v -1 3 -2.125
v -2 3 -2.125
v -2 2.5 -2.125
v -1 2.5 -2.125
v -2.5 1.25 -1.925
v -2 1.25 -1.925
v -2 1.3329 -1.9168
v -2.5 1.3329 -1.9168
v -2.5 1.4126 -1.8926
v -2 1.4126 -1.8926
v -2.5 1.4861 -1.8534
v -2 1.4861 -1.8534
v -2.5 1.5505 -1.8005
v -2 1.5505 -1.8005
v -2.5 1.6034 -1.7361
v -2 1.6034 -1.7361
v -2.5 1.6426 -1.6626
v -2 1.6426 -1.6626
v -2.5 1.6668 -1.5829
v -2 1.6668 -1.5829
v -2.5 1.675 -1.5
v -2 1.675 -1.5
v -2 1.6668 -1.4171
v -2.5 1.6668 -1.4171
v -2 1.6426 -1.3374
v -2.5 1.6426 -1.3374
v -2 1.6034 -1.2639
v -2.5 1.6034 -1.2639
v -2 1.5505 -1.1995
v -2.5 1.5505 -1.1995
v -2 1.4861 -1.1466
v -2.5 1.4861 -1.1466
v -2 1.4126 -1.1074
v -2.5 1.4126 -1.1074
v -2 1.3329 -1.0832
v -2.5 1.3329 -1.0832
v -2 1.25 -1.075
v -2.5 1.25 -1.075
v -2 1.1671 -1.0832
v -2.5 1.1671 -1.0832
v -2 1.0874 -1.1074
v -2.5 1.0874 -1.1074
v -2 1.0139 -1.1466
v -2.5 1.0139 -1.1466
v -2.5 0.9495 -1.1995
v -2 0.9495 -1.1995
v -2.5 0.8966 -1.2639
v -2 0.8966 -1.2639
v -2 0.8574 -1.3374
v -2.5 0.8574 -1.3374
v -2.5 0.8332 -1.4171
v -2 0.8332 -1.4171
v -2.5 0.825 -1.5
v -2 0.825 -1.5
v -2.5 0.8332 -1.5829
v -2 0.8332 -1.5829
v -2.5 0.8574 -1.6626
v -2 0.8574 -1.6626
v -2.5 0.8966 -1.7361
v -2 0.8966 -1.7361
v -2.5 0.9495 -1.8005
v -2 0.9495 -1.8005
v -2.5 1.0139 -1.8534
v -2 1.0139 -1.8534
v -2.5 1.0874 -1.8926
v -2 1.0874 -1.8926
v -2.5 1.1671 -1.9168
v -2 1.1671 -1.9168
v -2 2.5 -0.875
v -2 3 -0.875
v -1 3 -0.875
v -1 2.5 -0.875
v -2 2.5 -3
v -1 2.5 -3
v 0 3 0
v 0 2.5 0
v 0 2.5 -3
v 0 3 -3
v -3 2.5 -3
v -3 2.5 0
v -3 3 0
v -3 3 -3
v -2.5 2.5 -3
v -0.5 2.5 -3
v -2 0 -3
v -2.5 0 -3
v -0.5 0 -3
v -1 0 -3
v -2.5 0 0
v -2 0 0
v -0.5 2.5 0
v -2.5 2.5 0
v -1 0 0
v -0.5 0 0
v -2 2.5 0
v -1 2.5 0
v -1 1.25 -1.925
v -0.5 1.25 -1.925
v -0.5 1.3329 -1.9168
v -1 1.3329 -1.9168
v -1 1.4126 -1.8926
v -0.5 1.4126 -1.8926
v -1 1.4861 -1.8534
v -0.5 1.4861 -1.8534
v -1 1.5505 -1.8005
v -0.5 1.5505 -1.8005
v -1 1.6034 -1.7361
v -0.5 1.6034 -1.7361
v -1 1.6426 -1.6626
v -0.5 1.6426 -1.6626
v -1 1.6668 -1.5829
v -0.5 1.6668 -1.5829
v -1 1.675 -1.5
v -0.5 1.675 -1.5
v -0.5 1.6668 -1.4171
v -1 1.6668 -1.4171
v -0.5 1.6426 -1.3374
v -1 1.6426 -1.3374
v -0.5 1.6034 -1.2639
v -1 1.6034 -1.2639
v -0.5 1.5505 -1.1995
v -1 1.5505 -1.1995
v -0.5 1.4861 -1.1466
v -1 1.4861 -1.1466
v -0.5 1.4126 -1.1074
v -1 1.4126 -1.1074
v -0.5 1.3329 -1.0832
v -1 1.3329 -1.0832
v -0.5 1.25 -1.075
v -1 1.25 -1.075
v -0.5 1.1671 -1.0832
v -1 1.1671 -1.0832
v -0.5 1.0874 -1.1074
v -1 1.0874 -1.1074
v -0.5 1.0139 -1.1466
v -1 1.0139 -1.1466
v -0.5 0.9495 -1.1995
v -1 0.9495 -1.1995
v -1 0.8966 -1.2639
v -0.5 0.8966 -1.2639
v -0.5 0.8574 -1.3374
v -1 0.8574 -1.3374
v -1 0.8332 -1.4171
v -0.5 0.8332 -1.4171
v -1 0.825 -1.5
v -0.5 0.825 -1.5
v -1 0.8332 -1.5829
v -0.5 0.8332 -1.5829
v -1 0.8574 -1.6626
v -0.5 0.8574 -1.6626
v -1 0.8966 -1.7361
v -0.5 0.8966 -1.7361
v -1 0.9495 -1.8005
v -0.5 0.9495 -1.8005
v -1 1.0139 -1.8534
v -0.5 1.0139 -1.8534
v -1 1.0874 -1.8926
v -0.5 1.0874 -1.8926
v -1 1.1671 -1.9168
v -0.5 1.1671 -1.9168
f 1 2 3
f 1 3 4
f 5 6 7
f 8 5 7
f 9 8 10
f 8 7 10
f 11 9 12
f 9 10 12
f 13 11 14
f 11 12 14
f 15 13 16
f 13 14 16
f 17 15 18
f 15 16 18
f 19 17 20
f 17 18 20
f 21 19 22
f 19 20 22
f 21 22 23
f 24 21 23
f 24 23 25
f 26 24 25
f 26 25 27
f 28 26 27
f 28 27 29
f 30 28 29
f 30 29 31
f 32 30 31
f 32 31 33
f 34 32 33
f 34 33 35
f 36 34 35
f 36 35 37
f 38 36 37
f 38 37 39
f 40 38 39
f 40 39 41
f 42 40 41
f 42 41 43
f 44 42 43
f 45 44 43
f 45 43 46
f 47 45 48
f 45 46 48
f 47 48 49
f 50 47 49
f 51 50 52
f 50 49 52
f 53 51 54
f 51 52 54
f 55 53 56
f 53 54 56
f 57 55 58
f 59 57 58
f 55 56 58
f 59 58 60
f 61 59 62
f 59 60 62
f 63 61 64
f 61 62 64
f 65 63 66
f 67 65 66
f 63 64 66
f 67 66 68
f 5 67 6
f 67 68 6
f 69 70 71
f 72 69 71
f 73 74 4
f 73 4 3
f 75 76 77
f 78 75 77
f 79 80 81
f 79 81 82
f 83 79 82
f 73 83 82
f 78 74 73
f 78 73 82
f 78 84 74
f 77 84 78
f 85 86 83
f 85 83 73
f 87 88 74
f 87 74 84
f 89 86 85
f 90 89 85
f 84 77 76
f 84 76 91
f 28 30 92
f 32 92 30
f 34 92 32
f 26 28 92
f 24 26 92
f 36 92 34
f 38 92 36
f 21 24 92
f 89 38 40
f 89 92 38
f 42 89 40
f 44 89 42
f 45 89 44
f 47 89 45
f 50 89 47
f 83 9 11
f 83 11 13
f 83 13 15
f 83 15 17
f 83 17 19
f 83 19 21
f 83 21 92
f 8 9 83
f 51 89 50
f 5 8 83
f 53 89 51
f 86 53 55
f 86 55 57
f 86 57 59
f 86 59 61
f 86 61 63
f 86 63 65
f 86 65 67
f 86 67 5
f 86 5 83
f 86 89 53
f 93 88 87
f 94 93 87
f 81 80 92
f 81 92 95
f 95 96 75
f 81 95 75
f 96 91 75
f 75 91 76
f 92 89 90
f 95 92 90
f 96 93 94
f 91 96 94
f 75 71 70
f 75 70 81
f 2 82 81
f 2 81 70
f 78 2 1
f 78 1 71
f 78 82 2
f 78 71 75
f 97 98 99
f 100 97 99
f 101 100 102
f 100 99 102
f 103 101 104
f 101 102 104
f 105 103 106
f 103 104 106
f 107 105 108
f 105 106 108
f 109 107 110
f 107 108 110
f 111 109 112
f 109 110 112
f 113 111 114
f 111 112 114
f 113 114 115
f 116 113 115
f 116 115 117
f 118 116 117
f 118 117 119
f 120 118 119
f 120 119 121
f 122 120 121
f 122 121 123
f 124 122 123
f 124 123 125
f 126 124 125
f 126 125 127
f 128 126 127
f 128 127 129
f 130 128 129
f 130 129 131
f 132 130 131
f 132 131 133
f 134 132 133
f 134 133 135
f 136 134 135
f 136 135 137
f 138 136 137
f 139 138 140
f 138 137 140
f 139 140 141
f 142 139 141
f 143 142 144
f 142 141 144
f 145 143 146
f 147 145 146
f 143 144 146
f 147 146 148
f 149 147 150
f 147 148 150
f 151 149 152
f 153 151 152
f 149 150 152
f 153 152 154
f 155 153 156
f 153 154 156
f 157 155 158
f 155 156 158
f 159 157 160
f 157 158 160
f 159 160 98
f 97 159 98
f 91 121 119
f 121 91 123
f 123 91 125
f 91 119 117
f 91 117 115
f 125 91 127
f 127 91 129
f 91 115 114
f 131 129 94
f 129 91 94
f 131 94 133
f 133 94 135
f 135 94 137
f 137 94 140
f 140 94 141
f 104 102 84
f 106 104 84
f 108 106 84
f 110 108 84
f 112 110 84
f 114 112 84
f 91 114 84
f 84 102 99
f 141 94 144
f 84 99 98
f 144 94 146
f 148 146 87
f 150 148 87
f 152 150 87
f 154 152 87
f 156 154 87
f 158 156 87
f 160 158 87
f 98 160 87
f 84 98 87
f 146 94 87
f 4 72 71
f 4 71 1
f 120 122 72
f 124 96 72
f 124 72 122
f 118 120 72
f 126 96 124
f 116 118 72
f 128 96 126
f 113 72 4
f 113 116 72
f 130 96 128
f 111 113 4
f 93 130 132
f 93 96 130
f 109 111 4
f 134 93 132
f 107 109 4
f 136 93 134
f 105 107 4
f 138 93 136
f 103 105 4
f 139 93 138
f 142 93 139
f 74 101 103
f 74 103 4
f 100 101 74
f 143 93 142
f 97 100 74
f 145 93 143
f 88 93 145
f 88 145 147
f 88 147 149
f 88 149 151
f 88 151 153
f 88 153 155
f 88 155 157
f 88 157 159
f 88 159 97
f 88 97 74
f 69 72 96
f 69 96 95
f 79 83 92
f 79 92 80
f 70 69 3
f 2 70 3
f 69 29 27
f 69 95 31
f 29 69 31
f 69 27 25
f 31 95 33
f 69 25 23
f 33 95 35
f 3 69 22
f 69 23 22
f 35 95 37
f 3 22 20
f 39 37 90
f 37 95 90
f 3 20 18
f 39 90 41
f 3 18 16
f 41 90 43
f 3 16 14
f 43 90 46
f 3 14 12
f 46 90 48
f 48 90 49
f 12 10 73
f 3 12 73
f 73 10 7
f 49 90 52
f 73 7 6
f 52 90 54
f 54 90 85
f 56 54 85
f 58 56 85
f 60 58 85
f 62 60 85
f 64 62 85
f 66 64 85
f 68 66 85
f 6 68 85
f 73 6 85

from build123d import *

# Parameters (mm, degrees)
SKETCH2_W               = 3
SKETCH2_H               = 3
BOSS_EXTRUDE1_DEPTH     = 3
SKETCH3_W               = 1
SKETCH3_H               = 3
SKETCH3_W_2             = 0.5
CUT_EXTRUDE1_DEPTH      = 2.5
SKETCH5_R               = 0.425
CUT_EXTRUDE2_DEPTH      = 1.5
CUT_EXTRUDE2_DEPTH_BACK = 3.5
SKETCH6_W               = 1
SKETCH6_H               = 1.25
CUT_EXTRUDE3_DEPTH      = 1
CUT_EXTRUDE3_DEPTH_BACK = 4


with BuildPart() as part:
    # Sketch2 → Boss-Extrude1 (new body)
    with BuildSketch(Plane(origin=(0, 0, 0), x_dir=(1, 0, 0), z_dir=(0, 1, 0))):
        with Locations((-1.5, 1.5)):
            Rectangle(SKETCH2_W, SKETCH2_H)
    extrude(amount=BOSS_EXTRUDE1_DEPTH)

    # Sketch3 → Cut-Extrude1 (cut)
    with BuildSketch(Plane(origin=(0, 0, 0), x_dir=(-1, 0, 0), z_dir=(0, -1, 0))):
        with Locations((1.5, 1.5)):
            Rectangle(SKETCH3_W, SKETCH3_H)
        with Locations((0.25, 1.5)):
            Rectangle(SKETCH3_W_2, SKETCH3_H)
        with Locations((2.75, 1.5)):
            Rectangle(SKETCH3_W_2, SKETCH3_H)
    extrude(amount=-CUT_EXTRUDE1_DEPTH, mode=Mode.SUBTRACT)

    # Sketch5 → Cut-Extrude2 (cut, two sides)
    with BuildSketch(Plane(origin=(-0.5, 0, 0), x_dir=(0, 0, -1), z_dir=(1, 0, 0))) as cut_extrude2_sk:
        with Locations((1.5, 1.25)):
            Circle(SKETCH5_R)
    extrude(amount=CUT_EXTRUDE2_DEPTH, mode=Mode.SUBTRACT)
    extrude(cut_extrude2_sk.sketch, amount=-CUT_EXTRUDE2_DEPTH_BACK, mode=Mode.SUBTRACT)

    # Sketch6 → Cut-Extrude3 (cut, two sides)
    with BuildSketch(Plane(origin=(0, 3, 0), x_dir=(1, 0, 0), z_dir=(0, 1, 0))) as cut_extrude3_sk:
        with Locations((-1.5, 1.5)):
            Rectangle(SKETCH6_W, SKETCH6_H)
    extrude(amount=CUT_EXTRUDE3_DEPTH, mode=Mode.SUBTRACT)
    extrude(cut_extrude3_sk.sketch, amount=-CUT_EXTRUDE3_DEPTH_BACK, mode=Mode.SUBTRACT)


solid = part.part
